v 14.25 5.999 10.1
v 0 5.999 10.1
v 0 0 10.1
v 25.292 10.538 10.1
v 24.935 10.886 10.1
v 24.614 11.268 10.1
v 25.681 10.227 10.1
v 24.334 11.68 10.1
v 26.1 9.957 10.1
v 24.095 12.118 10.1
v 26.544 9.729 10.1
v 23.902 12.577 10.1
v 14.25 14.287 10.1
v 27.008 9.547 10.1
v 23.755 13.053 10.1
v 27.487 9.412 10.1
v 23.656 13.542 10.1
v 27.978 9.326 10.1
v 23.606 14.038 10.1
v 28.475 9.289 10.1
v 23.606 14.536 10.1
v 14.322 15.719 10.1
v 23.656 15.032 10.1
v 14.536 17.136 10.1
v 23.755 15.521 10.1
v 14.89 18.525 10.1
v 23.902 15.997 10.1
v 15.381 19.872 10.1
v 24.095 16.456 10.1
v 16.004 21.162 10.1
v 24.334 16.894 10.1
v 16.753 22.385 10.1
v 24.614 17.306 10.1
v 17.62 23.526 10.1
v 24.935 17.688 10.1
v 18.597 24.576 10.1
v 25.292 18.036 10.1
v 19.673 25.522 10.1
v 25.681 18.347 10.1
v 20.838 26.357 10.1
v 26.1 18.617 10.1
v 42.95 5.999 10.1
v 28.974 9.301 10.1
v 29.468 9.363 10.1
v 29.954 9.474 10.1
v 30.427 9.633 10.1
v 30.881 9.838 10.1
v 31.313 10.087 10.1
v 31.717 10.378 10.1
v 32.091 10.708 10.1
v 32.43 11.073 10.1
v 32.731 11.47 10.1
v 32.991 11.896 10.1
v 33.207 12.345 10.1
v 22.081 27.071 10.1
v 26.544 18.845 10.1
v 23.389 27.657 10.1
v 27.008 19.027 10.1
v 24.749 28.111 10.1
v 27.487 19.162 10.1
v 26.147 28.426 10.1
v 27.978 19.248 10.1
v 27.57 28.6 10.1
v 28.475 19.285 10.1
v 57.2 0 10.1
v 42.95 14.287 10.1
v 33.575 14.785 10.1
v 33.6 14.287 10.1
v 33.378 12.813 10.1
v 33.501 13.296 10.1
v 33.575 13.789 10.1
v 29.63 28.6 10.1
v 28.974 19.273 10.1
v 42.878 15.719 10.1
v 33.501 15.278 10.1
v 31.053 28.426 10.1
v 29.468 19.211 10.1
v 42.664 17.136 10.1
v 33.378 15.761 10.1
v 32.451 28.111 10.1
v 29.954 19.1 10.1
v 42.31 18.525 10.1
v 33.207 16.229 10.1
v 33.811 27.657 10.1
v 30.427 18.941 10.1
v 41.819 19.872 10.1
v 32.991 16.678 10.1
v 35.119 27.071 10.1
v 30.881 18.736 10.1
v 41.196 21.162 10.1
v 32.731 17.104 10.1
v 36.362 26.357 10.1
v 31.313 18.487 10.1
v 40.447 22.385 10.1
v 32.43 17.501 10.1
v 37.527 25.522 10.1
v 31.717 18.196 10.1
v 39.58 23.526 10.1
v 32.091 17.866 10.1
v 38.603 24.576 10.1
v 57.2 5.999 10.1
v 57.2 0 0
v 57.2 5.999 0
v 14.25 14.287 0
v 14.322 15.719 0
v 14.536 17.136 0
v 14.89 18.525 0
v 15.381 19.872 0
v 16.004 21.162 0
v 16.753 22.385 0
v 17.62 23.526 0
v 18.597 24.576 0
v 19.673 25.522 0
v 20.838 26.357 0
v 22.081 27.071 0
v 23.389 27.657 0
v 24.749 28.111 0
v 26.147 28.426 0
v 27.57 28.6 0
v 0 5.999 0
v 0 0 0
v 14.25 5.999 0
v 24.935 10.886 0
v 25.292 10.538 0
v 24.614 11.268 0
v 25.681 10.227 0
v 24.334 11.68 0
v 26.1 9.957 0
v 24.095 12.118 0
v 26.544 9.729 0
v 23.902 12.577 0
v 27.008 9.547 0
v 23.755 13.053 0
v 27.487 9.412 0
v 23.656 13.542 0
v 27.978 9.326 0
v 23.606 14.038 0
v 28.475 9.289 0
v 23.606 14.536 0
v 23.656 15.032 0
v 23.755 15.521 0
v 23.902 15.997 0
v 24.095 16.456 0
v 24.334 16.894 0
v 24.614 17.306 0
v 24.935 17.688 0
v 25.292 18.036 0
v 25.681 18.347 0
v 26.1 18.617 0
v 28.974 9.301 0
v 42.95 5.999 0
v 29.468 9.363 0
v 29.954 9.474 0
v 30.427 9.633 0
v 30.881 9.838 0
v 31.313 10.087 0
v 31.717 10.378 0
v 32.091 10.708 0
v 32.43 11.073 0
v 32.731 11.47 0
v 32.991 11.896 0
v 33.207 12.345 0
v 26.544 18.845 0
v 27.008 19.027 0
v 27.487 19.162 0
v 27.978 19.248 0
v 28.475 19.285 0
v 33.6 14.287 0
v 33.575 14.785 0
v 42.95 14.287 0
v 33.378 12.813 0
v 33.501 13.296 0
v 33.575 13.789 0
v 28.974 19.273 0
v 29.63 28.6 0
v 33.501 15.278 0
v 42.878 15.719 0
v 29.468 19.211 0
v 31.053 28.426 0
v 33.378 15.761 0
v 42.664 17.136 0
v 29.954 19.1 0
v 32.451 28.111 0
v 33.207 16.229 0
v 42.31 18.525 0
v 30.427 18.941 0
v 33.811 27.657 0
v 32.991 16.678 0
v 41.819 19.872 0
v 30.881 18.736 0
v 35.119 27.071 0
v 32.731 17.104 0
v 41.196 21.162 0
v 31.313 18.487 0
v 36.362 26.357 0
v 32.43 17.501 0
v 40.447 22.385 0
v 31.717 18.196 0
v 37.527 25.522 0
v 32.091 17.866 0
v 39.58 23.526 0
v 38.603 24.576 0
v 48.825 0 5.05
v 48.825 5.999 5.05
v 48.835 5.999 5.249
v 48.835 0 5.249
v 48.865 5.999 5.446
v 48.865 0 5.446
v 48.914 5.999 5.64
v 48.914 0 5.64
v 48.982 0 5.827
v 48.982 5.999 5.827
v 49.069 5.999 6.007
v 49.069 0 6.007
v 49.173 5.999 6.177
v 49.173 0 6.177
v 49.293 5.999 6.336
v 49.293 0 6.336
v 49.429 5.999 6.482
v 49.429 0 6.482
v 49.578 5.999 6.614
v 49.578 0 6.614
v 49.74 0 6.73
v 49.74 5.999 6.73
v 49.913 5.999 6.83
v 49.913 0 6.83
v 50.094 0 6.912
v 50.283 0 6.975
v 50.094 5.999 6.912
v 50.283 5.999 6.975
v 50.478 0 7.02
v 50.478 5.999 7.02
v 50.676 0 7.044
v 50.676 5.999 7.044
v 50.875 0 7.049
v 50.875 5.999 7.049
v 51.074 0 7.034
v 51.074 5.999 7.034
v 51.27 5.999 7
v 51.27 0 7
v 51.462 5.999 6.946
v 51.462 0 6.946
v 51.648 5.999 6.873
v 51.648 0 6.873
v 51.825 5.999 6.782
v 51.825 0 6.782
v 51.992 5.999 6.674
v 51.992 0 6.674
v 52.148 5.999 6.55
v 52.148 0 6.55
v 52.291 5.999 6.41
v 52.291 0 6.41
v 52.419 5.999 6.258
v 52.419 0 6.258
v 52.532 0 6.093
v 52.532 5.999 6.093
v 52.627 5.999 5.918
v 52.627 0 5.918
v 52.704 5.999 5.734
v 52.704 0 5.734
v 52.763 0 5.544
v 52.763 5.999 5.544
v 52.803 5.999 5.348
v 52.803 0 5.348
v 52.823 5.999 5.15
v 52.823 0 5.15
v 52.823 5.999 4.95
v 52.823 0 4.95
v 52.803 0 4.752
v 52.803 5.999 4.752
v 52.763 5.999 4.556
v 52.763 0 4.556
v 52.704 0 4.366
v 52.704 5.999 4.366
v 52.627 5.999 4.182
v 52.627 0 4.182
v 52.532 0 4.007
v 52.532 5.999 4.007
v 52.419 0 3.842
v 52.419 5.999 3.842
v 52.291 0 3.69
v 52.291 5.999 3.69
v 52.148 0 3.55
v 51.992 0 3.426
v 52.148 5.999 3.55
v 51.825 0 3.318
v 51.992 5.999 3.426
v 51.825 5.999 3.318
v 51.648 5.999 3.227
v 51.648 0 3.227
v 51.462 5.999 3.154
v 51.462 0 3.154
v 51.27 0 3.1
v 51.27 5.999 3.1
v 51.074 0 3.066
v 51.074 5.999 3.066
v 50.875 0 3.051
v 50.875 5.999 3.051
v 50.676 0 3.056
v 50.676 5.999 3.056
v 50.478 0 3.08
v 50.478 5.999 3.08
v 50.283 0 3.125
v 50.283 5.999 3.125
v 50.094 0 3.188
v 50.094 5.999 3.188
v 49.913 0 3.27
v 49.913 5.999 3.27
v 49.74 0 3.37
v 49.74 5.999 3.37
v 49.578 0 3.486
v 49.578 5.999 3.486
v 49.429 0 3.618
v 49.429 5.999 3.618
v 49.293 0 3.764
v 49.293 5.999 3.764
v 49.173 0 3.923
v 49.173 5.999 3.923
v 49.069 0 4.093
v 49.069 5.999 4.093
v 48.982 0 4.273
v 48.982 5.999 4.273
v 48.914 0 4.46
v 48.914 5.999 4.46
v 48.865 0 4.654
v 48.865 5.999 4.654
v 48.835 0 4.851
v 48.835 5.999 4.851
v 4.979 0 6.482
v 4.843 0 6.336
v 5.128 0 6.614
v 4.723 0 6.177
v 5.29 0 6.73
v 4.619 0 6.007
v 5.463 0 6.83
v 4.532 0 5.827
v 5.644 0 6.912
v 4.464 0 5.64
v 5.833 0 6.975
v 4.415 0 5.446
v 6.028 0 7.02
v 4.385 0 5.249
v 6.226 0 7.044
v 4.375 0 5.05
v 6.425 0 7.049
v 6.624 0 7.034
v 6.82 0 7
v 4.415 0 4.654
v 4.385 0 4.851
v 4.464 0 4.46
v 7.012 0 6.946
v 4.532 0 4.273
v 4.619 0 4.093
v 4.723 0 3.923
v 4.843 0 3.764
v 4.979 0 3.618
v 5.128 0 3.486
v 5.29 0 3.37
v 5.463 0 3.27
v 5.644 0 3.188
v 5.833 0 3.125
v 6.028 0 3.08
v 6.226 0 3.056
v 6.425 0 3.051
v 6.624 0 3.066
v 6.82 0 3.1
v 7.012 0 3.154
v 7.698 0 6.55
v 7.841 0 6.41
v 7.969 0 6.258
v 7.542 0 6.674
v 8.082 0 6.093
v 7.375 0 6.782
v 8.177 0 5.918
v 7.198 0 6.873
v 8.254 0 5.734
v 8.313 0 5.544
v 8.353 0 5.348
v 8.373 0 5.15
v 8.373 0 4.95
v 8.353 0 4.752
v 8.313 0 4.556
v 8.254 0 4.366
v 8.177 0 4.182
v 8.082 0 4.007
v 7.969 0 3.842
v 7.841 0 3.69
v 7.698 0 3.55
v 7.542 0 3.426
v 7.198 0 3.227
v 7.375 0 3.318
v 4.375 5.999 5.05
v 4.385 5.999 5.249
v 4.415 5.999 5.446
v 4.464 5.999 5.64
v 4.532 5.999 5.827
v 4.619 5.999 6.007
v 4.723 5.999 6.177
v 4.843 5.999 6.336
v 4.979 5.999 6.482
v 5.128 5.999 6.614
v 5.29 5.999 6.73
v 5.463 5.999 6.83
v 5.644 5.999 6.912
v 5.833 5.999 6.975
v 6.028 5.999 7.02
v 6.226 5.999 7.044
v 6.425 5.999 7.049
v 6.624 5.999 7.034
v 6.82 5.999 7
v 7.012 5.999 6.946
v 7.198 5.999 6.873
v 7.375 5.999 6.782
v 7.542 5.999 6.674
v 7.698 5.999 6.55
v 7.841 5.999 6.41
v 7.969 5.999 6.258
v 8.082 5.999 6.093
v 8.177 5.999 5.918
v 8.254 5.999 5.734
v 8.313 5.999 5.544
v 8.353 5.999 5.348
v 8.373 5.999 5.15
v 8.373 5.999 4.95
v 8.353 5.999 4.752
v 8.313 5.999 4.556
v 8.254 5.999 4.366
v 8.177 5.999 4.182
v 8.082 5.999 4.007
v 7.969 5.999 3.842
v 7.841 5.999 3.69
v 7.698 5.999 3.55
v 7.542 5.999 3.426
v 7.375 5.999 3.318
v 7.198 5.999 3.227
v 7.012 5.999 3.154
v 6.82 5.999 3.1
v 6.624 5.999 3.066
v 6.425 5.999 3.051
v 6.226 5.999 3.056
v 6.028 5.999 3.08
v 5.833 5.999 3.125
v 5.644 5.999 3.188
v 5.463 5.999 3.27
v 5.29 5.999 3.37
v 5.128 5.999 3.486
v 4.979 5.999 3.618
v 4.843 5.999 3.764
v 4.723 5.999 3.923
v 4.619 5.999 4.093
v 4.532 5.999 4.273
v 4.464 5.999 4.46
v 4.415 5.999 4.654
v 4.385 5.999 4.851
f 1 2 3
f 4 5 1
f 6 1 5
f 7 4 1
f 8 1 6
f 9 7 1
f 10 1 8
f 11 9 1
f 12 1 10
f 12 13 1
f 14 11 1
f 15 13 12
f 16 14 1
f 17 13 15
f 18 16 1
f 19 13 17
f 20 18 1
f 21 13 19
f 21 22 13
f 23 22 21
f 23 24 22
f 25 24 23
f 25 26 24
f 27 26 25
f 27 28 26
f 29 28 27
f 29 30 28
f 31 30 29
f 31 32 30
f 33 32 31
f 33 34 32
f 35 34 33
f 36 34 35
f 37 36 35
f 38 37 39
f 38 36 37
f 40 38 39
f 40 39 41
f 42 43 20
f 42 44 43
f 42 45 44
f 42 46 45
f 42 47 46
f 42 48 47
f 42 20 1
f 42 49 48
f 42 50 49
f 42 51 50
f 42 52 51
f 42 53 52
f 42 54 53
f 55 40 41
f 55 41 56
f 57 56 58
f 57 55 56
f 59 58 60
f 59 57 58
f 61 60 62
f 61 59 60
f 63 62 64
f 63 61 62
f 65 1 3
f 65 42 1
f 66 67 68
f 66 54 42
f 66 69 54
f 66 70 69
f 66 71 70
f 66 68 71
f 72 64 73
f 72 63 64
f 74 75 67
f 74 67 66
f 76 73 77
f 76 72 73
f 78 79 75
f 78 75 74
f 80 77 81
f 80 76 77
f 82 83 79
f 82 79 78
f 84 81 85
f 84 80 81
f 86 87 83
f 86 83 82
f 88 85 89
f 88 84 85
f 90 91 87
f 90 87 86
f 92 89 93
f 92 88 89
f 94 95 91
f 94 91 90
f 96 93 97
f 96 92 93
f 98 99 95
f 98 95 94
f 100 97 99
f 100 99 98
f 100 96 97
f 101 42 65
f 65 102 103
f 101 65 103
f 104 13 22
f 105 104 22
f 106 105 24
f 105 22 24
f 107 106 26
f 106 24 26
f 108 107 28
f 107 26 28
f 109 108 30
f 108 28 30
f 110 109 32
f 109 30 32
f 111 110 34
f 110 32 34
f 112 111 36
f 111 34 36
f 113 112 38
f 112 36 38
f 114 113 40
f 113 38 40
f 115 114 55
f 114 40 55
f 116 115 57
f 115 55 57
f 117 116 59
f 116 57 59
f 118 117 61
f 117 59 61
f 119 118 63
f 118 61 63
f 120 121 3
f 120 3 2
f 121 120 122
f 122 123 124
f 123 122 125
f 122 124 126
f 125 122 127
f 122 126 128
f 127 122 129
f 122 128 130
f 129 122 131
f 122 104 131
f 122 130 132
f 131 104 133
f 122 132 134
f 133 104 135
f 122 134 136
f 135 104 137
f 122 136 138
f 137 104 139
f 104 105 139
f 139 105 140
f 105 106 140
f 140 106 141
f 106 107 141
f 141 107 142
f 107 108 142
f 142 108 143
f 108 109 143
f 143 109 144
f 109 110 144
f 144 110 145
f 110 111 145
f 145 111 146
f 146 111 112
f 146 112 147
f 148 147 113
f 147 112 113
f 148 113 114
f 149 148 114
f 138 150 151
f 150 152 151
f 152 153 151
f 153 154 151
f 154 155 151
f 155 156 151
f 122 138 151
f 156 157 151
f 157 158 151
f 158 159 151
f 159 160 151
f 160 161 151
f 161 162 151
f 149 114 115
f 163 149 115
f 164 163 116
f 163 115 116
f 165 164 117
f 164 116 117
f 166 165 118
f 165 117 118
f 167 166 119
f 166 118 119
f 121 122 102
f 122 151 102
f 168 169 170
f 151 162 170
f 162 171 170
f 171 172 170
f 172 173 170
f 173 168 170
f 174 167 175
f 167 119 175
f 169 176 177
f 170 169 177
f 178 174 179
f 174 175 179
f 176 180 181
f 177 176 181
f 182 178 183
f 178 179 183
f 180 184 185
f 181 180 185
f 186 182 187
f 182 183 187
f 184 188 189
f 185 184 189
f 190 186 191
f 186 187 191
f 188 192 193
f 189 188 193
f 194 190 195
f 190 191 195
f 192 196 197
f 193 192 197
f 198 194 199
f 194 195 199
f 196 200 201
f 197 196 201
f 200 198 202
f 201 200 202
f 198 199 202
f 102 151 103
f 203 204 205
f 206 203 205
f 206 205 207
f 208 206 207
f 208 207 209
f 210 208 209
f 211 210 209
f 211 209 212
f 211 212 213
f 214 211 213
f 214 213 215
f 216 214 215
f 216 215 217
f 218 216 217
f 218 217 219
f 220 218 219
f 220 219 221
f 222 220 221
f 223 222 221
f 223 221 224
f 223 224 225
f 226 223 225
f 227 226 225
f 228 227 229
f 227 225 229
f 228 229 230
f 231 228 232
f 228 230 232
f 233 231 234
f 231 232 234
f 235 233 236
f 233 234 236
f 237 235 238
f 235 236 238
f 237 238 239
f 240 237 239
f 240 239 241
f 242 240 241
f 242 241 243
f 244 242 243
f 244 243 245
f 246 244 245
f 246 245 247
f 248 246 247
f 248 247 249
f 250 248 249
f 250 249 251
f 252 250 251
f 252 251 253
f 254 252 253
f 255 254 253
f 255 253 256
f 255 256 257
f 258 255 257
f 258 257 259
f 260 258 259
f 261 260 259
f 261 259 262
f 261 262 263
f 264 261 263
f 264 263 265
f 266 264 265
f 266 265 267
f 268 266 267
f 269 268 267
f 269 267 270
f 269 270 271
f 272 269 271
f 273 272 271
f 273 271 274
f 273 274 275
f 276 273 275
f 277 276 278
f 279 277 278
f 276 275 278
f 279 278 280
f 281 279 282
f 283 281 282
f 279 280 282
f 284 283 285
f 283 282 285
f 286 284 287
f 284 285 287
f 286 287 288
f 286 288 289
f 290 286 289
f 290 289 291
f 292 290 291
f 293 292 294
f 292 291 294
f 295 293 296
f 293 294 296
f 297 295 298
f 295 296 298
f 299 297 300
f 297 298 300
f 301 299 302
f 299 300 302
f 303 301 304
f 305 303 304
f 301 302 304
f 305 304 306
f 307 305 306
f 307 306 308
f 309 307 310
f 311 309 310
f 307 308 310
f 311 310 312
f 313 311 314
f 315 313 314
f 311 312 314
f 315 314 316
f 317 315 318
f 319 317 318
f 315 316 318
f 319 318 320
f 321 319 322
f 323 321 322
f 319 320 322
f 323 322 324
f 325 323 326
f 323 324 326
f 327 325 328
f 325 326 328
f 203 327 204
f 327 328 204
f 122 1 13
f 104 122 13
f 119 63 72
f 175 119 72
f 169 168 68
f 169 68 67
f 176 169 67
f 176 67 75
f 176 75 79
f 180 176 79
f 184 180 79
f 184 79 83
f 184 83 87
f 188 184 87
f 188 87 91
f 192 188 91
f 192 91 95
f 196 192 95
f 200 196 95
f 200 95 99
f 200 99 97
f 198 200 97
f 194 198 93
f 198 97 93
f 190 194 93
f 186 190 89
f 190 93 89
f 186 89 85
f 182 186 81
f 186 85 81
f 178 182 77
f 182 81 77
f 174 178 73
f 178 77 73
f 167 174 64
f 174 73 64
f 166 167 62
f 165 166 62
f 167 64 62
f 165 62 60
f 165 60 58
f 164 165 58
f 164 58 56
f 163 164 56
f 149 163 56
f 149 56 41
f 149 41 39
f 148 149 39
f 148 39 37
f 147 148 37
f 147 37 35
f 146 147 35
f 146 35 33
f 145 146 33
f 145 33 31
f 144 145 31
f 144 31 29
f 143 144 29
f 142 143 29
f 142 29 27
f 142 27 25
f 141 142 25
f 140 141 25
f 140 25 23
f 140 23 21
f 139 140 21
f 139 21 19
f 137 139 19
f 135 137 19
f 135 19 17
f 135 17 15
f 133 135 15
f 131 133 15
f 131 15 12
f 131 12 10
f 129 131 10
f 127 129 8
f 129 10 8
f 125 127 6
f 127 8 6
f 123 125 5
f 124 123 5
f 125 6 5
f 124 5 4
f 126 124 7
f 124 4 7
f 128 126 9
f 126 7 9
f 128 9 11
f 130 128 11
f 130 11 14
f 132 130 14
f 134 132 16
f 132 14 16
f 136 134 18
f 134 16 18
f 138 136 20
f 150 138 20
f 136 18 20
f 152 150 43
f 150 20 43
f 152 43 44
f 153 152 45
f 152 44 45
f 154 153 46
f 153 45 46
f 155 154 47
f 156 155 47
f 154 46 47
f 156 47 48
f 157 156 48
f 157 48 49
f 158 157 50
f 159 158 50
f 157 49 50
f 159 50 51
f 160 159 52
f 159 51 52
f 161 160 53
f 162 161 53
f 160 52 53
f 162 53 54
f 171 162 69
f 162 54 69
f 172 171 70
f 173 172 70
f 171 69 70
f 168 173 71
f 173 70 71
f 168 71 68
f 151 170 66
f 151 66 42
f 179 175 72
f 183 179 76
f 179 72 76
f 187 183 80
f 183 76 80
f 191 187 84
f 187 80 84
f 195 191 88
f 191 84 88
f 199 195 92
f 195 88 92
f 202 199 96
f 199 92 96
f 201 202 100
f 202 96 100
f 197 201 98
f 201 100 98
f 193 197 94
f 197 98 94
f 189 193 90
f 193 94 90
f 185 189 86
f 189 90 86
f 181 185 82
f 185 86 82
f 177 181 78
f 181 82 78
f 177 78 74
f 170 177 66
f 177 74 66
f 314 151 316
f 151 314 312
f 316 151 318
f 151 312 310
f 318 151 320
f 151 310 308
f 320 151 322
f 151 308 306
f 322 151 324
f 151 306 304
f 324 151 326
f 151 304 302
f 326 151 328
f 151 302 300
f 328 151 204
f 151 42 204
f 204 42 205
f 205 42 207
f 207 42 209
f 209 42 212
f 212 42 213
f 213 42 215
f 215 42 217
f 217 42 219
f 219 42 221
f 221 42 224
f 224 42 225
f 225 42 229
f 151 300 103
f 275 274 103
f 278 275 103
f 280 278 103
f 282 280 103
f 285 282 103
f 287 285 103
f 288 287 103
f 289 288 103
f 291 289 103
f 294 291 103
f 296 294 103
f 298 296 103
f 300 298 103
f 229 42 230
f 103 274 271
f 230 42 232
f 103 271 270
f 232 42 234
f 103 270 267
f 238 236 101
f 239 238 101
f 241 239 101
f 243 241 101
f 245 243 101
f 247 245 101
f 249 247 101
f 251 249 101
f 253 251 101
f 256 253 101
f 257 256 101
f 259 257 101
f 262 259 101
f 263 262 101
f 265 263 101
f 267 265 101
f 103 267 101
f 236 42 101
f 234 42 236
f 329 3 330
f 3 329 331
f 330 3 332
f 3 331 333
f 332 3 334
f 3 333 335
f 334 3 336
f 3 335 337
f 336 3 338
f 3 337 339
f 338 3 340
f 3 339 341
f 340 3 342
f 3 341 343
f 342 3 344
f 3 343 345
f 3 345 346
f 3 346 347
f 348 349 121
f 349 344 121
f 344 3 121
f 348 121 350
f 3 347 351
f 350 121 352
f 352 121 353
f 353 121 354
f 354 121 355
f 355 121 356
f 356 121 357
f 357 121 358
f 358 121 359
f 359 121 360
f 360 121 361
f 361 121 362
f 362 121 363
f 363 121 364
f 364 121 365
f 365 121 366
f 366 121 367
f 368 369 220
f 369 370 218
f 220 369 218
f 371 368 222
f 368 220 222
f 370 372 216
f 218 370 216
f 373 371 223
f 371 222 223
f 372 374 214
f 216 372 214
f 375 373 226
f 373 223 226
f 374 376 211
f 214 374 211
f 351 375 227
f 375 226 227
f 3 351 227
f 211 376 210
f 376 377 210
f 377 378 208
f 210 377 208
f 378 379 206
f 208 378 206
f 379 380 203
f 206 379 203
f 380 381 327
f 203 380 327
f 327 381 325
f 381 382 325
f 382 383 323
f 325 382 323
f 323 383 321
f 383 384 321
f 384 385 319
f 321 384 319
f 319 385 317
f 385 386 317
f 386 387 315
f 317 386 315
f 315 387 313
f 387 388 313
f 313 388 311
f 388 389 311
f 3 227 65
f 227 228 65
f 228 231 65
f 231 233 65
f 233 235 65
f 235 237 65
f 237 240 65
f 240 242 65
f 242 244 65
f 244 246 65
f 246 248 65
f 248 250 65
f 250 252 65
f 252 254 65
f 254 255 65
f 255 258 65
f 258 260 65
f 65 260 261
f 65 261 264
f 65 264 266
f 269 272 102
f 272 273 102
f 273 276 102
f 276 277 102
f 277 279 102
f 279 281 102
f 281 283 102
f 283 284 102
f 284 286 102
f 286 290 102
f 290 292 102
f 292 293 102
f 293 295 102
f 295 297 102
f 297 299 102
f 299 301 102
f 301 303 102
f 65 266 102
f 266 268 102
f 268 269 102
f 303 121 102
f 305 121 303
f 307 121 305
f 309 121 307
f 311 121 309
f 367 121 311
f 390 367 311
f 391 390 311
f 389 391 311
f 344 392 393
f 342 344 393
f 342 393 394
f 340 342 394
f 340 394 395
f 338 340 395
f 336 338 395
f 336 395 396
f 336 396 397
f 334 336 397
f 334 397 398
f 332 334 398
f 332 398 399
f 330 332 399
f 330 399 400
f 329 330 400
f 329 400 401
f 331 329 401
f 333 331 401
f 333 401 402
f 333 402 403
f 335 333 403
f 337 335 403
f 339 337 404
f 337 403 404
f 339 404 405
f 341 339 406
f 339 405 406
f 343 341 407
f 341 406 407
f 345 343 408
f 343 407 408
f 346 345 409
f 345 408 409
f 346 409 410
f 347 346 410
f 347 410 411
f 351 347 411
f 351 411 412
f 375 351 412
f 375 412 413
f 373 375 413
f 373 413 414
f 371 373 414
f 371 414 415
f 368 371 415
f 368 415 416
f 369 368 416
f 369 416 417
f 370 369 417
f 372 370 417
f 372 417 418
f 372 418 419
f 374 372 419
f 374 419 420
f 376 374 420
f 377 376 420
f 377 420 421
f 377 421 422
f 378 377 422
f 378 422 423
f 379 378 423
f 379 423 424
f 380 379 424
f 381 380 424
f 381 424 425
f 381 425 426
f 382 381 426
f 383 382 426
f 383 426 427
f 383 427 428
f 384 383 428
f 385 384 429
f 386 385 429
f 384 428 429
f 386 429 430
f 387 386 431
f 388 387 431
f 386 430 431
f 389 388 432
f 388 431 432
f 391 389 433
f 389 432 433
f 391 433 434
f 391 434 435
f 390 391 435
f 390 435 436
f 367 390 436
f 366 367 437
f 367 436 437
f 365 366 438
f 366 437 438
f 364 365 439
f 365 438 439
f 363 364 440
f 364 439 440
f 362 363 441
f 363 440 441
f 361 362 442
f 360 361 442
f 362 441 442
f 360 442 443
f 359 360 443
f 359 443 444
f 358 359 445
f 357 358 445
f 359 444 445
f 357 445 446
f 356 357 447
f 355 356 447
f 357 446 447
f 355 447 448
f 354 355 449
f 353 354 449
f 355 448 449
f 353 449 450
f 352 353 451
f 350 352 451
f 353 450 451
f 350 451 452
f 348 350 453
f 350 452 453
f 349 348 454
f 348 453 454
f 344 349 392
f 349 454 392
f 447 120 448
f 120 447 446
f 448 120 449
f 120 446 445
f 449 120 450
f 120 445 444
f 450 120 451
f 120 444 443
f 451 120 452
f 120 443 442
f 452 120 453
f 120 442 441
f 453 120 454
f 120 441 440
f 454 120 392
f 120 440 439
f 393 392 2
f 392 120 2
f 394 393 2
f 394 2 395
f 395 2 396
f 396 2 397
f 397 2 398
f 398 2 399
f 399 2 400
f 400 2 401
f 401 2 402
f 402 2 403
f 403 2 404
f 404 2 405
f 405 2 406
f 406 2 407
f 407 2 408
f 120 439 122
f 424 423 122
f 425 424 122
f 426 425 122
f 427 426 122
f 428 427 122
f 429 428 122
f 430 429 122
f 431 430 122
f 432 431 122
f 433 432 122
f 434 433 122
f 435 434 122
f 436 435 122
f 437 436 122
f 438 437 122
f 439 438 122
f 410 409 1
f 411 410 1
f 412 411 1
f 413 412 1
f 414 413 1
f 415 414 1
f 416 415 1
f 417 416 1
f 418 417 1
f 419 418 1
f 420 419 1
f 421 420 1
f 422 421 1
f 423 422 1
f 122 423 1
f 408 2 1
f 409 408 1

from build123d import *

# Parameters (mm, degrees)
SKETCH1_W               = 57.2
SKETCH1_H               = 28.6
BOSS_EXTRUDE1_DEPTH     = 10.1
SKETCH3_R               = 5
CUT_EXTRUDE2_DEPTH      = 11.1
CUT_EXTRUDE3_DEPTH      = 1
CUT_EXTRUDE3_DEPTH_BACK = 11.1
SKETCH5_R               = 2
CUT_EXTRUDE4_DEPTH      = 6.999141562


with BuildPart() as part:
    # Sketch1 → Boss-Extrude1 (new body)
    with BuildSketch(Plane.XY):
        with Locations((28.6, 14.3)):
            Rectangle(SKETCH1_W, SKETCH1_H)
    extrude(amount=BOSS_EXTRUDE1_DEPTH)

    # Sketch3 → Cut-Extrude2 (cut, through all)
    with BuildSketch(Plane.XY.offset(10.1)):
        with Locations((28.6, 14.287)):
            Circle(SKETCH3_R)
    extrude(amount=-CUT_EXTRUDE2_DEPTH, mode=Mode.SUBTRACT)

    # Sketch4 → Cut-Extrude3 (cut, two sides)
    with BuildSketch(Plane.XY.offset(10.1)) as cut_extrude3_sk:
        with BuildLine():
            Line((-133.041822115, 5.999141562), (0, 5.999141562))
            Line((0, 5.999141562), (14.25, 5.999141562))
            Line((14.25, 5.999141562), (14.25, 14.287))
            ThreePointArc((14.25, 14.287), (28.6, 28.637), (42.95, 14.287))
            Line((42.95, 14.287), (42.95, 5.999141562))
            Line((42.95, 5.999141562), (57.219085061, 5.999141562))
            Line((57.219085061, 5.999141562), (190.260907176, 5.999141562))
            Line((190.260907176, 5.999141562), (190.260907176, 272.082785792))
            Line((190.260907176, 272.082785792), (-133.041822115, 272.082785792))
            Line((-133.041822115, 272.082785792), (-133.041822115, 5.999141562))
        make_face()
    extrude(amount=CUT_EXTRUDE3_DEPTH, mode=Mode.SUBTRACT)
    extrude(cut_extrude3_sk.sketch, amount=-CUT_EXTRUDE3_DEPTH_BACK, mode=Mode.SUBTRACT)

    # Sketch5 → Cut-Extrude4 (cut, through all)
    with BuildSketch(Plane(origin=(0, 5.999141562, 0), x_dir=(-1, 0, 0), z_dir=(0, 1, 0))):
        with Locations((-6.375, 5.05)):
            Circle(SKETCH5_R)
        with Locations((-50.825, 5.05)):
            Circle(SKETCH5_R)
    extrude(amount=-CUT_EXTRUDE4_DEPTH, mode=Mode.SUBTRACT)


solid = part.part
